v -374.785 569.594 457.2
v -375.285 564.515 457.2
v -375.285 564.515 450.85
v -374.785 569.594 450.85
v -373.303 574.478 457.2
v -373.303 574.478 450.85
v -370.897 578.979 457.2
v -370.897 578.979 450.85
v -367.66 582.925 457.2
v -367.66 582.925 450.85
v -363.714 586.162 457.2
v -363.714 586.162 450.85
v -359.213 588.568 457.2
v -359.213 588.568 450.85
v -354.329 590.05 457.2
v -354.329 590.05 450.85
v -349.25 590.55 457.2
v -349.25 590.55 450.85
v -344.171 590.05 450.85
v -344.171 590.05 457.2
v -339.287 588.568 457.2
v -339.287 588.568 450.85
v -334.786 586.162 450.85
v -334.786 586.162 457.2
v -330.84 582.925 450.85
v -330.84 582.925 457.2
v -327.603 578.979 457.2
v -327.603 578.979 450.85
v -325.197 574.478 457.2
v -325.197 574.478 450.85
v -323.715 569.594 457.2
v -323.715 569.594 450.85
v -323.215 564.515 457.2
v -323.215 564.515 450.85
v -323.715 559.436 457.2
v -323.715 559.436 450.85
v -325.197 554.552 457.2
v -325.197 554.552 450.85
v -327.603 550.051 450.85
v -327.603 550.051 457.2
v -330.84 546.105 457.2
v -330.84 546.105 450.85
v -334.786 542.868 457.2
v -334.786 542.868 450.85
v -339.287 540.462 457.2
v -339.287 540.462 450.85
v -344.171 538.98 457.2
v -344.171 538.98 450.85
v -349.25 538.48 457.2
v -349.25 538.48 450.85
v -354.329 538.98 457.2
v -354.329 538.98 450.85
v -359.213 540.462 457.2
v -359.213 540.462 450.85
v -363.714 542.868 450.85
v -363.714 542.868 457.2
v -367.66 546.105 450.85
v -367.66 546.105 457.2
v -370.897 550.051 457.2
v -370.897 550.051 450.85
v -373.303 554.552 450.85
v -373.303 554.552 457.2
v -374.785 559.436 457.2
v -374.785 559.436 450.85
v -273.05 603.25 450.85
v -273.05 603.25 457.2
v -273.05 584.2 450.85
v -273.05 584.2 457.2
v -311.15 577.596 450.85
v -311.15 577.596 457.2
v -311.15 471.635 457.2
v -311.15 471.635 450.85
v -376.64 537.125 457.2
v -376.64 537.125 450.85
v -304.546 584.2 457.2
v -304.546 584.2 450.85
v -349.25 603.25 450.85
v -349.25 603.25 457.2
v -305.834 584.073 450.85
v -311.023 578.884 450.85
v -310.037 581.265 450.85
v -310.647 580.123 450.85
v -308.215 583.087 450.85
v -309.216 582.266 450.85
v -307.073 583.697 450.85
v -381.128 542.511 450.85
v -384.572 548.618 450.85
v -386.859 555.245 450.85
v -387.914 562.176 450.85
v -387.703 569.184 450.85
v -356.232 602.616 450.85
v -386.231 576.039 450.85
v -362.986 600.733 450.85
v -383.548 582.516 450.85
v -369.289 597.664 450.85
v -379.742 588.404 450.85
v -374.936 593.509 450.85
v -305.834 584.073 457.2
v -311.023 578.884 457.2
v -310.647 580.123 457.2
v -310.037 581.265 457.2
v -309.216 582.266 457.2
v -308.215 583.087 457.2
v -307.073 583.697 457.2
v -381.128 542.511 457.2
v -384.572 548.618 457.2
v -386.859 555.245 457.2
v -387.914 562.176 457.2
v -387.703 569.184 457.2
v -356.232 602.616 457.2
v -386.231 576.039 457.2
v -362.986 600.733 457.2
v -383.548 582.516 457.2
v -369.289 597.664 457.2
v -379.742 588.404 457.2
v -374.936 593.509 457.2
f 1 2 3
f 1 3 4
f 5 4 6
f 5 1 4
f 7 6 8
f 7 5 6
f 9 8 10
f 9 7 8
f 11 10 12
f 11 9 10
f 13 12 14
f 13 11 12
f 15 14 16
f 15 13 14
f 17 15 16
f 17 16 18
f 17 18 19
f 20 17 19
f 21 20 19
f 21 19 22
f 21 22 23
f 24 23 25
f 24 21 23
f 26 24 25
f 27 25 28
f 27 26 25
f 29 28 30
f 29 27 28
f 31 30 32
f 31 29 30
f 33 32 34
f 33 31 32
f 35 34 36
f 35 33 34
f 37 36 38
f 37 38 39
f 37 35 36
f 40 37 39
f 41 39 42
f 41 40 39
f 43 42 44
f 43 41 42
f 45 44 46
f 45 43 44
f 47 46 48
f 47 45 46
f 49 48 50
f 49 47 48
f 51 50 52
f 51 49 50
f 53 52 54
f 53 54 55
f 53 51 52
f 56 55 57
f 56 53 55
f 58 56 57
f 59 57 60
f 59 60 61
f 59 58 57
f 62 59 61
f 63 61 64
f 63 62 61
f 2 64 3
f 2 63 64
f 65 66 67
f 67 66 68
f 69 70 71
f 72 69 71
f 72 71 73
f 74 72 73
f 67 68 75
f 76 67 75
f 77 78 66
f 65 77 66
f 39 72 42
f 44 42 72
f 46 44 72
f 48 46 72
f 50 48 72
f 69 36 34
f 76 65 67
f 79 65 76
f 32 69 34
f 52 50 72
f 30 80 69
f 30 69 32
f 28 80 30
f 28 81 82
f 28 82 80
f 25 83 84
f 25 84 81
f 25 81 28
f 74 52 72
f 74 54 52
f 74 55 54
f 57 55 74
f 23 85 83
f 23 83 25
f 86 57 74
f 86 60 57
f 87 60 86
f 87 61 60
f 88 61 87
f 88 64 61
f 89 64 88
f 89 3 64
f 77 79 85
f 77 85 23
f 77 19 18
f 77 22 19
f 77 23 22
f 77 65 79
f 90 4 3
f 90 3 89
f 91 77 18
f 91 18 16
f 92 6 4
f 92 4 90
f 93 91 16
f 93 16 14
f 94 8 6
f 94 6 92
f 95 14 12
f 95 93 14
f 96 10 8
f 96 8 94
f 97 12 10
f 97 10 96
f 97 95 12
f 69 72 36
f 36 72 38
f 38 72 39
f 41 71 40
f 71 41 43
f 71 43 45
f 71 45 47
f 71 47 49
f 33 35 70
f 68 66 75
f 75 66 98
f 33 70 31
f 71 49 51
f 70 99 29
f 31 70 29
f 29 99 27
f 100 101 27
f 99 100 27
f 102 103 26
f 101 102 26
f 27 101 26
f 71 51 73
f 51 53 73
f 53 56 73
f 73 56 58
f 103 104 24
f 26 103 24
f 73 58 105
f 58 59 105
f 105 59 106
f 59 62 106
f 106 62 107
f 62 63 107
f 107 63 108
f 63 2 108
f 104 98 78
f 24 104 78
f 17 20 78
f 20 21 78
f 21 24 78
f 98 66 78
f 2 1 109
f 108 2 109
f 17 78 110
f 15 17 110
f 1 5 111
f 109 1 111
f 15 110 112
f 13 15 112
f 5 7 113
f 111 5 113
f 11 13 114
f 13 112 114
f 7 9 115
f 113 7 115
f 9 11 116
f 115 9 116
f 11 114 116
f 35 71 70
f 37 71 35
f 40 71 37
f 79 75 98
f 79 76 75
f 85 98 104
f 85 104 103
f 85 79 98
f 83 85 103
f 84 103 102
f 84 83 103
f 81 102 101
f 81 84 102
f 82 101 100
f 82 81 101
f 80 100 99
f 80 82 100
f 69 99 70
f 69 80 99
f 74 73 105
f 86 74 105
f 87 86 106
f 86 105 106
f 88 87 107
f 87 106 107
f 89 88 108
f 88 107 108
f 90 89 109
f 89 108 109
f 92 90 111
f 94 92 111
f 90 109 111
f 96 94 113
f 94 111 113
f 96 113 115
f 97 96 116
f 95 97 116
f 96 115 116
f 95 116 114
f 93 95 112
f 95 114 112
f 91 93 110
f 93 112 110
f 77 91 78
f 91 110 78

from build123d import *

# Parameters (mm, degrees)
SKETCH1_R           = 26.035
BOSS_EXTRUDE1_DEPTH = 6.35
FILLET1_R           = 6.604


with BuildPart() as part:
    # Sketch1 → Boss-Extrude1 (new body)
    with BuildSketch(Plane(origin=(0, 0, 457.2), x_dir=(-1, 0, 0), z_dir=(0, 0, -1))):
        with BuildLine():
            Line((273.05, 603.25), (273.05, 584.2))
            Line((273.05, 584.2), (311.15, 584.2))
            Line((311.15, 584.2), (311.15, 471.635437661))
            Line((311.15, 471.635437661), (376.639781169, 537.125218831))
            ThreePointArc((376.639781169, 537.125218831), (385.036473692, 579.338242753), (349.25, 603.25))
            Line((349.25, 603.25), (273.05, 603.25))
        make_face()
        with Locations((349.25, 564.515)):
            Circle(SKETCH1_R, mode=Mode.SUBTRACT)
    extrude(amount=BOSS_EXTRUDE1_DEPTH)

    # Fillet1
    fillet1_edges = [part.edges().sort_by_distance(p)[0] for p in [
        (-311.15, 584.2, 454.025),
    ]]
    fillet(fillet1_edges, radius=FILLET1_R)


solid = part.part
